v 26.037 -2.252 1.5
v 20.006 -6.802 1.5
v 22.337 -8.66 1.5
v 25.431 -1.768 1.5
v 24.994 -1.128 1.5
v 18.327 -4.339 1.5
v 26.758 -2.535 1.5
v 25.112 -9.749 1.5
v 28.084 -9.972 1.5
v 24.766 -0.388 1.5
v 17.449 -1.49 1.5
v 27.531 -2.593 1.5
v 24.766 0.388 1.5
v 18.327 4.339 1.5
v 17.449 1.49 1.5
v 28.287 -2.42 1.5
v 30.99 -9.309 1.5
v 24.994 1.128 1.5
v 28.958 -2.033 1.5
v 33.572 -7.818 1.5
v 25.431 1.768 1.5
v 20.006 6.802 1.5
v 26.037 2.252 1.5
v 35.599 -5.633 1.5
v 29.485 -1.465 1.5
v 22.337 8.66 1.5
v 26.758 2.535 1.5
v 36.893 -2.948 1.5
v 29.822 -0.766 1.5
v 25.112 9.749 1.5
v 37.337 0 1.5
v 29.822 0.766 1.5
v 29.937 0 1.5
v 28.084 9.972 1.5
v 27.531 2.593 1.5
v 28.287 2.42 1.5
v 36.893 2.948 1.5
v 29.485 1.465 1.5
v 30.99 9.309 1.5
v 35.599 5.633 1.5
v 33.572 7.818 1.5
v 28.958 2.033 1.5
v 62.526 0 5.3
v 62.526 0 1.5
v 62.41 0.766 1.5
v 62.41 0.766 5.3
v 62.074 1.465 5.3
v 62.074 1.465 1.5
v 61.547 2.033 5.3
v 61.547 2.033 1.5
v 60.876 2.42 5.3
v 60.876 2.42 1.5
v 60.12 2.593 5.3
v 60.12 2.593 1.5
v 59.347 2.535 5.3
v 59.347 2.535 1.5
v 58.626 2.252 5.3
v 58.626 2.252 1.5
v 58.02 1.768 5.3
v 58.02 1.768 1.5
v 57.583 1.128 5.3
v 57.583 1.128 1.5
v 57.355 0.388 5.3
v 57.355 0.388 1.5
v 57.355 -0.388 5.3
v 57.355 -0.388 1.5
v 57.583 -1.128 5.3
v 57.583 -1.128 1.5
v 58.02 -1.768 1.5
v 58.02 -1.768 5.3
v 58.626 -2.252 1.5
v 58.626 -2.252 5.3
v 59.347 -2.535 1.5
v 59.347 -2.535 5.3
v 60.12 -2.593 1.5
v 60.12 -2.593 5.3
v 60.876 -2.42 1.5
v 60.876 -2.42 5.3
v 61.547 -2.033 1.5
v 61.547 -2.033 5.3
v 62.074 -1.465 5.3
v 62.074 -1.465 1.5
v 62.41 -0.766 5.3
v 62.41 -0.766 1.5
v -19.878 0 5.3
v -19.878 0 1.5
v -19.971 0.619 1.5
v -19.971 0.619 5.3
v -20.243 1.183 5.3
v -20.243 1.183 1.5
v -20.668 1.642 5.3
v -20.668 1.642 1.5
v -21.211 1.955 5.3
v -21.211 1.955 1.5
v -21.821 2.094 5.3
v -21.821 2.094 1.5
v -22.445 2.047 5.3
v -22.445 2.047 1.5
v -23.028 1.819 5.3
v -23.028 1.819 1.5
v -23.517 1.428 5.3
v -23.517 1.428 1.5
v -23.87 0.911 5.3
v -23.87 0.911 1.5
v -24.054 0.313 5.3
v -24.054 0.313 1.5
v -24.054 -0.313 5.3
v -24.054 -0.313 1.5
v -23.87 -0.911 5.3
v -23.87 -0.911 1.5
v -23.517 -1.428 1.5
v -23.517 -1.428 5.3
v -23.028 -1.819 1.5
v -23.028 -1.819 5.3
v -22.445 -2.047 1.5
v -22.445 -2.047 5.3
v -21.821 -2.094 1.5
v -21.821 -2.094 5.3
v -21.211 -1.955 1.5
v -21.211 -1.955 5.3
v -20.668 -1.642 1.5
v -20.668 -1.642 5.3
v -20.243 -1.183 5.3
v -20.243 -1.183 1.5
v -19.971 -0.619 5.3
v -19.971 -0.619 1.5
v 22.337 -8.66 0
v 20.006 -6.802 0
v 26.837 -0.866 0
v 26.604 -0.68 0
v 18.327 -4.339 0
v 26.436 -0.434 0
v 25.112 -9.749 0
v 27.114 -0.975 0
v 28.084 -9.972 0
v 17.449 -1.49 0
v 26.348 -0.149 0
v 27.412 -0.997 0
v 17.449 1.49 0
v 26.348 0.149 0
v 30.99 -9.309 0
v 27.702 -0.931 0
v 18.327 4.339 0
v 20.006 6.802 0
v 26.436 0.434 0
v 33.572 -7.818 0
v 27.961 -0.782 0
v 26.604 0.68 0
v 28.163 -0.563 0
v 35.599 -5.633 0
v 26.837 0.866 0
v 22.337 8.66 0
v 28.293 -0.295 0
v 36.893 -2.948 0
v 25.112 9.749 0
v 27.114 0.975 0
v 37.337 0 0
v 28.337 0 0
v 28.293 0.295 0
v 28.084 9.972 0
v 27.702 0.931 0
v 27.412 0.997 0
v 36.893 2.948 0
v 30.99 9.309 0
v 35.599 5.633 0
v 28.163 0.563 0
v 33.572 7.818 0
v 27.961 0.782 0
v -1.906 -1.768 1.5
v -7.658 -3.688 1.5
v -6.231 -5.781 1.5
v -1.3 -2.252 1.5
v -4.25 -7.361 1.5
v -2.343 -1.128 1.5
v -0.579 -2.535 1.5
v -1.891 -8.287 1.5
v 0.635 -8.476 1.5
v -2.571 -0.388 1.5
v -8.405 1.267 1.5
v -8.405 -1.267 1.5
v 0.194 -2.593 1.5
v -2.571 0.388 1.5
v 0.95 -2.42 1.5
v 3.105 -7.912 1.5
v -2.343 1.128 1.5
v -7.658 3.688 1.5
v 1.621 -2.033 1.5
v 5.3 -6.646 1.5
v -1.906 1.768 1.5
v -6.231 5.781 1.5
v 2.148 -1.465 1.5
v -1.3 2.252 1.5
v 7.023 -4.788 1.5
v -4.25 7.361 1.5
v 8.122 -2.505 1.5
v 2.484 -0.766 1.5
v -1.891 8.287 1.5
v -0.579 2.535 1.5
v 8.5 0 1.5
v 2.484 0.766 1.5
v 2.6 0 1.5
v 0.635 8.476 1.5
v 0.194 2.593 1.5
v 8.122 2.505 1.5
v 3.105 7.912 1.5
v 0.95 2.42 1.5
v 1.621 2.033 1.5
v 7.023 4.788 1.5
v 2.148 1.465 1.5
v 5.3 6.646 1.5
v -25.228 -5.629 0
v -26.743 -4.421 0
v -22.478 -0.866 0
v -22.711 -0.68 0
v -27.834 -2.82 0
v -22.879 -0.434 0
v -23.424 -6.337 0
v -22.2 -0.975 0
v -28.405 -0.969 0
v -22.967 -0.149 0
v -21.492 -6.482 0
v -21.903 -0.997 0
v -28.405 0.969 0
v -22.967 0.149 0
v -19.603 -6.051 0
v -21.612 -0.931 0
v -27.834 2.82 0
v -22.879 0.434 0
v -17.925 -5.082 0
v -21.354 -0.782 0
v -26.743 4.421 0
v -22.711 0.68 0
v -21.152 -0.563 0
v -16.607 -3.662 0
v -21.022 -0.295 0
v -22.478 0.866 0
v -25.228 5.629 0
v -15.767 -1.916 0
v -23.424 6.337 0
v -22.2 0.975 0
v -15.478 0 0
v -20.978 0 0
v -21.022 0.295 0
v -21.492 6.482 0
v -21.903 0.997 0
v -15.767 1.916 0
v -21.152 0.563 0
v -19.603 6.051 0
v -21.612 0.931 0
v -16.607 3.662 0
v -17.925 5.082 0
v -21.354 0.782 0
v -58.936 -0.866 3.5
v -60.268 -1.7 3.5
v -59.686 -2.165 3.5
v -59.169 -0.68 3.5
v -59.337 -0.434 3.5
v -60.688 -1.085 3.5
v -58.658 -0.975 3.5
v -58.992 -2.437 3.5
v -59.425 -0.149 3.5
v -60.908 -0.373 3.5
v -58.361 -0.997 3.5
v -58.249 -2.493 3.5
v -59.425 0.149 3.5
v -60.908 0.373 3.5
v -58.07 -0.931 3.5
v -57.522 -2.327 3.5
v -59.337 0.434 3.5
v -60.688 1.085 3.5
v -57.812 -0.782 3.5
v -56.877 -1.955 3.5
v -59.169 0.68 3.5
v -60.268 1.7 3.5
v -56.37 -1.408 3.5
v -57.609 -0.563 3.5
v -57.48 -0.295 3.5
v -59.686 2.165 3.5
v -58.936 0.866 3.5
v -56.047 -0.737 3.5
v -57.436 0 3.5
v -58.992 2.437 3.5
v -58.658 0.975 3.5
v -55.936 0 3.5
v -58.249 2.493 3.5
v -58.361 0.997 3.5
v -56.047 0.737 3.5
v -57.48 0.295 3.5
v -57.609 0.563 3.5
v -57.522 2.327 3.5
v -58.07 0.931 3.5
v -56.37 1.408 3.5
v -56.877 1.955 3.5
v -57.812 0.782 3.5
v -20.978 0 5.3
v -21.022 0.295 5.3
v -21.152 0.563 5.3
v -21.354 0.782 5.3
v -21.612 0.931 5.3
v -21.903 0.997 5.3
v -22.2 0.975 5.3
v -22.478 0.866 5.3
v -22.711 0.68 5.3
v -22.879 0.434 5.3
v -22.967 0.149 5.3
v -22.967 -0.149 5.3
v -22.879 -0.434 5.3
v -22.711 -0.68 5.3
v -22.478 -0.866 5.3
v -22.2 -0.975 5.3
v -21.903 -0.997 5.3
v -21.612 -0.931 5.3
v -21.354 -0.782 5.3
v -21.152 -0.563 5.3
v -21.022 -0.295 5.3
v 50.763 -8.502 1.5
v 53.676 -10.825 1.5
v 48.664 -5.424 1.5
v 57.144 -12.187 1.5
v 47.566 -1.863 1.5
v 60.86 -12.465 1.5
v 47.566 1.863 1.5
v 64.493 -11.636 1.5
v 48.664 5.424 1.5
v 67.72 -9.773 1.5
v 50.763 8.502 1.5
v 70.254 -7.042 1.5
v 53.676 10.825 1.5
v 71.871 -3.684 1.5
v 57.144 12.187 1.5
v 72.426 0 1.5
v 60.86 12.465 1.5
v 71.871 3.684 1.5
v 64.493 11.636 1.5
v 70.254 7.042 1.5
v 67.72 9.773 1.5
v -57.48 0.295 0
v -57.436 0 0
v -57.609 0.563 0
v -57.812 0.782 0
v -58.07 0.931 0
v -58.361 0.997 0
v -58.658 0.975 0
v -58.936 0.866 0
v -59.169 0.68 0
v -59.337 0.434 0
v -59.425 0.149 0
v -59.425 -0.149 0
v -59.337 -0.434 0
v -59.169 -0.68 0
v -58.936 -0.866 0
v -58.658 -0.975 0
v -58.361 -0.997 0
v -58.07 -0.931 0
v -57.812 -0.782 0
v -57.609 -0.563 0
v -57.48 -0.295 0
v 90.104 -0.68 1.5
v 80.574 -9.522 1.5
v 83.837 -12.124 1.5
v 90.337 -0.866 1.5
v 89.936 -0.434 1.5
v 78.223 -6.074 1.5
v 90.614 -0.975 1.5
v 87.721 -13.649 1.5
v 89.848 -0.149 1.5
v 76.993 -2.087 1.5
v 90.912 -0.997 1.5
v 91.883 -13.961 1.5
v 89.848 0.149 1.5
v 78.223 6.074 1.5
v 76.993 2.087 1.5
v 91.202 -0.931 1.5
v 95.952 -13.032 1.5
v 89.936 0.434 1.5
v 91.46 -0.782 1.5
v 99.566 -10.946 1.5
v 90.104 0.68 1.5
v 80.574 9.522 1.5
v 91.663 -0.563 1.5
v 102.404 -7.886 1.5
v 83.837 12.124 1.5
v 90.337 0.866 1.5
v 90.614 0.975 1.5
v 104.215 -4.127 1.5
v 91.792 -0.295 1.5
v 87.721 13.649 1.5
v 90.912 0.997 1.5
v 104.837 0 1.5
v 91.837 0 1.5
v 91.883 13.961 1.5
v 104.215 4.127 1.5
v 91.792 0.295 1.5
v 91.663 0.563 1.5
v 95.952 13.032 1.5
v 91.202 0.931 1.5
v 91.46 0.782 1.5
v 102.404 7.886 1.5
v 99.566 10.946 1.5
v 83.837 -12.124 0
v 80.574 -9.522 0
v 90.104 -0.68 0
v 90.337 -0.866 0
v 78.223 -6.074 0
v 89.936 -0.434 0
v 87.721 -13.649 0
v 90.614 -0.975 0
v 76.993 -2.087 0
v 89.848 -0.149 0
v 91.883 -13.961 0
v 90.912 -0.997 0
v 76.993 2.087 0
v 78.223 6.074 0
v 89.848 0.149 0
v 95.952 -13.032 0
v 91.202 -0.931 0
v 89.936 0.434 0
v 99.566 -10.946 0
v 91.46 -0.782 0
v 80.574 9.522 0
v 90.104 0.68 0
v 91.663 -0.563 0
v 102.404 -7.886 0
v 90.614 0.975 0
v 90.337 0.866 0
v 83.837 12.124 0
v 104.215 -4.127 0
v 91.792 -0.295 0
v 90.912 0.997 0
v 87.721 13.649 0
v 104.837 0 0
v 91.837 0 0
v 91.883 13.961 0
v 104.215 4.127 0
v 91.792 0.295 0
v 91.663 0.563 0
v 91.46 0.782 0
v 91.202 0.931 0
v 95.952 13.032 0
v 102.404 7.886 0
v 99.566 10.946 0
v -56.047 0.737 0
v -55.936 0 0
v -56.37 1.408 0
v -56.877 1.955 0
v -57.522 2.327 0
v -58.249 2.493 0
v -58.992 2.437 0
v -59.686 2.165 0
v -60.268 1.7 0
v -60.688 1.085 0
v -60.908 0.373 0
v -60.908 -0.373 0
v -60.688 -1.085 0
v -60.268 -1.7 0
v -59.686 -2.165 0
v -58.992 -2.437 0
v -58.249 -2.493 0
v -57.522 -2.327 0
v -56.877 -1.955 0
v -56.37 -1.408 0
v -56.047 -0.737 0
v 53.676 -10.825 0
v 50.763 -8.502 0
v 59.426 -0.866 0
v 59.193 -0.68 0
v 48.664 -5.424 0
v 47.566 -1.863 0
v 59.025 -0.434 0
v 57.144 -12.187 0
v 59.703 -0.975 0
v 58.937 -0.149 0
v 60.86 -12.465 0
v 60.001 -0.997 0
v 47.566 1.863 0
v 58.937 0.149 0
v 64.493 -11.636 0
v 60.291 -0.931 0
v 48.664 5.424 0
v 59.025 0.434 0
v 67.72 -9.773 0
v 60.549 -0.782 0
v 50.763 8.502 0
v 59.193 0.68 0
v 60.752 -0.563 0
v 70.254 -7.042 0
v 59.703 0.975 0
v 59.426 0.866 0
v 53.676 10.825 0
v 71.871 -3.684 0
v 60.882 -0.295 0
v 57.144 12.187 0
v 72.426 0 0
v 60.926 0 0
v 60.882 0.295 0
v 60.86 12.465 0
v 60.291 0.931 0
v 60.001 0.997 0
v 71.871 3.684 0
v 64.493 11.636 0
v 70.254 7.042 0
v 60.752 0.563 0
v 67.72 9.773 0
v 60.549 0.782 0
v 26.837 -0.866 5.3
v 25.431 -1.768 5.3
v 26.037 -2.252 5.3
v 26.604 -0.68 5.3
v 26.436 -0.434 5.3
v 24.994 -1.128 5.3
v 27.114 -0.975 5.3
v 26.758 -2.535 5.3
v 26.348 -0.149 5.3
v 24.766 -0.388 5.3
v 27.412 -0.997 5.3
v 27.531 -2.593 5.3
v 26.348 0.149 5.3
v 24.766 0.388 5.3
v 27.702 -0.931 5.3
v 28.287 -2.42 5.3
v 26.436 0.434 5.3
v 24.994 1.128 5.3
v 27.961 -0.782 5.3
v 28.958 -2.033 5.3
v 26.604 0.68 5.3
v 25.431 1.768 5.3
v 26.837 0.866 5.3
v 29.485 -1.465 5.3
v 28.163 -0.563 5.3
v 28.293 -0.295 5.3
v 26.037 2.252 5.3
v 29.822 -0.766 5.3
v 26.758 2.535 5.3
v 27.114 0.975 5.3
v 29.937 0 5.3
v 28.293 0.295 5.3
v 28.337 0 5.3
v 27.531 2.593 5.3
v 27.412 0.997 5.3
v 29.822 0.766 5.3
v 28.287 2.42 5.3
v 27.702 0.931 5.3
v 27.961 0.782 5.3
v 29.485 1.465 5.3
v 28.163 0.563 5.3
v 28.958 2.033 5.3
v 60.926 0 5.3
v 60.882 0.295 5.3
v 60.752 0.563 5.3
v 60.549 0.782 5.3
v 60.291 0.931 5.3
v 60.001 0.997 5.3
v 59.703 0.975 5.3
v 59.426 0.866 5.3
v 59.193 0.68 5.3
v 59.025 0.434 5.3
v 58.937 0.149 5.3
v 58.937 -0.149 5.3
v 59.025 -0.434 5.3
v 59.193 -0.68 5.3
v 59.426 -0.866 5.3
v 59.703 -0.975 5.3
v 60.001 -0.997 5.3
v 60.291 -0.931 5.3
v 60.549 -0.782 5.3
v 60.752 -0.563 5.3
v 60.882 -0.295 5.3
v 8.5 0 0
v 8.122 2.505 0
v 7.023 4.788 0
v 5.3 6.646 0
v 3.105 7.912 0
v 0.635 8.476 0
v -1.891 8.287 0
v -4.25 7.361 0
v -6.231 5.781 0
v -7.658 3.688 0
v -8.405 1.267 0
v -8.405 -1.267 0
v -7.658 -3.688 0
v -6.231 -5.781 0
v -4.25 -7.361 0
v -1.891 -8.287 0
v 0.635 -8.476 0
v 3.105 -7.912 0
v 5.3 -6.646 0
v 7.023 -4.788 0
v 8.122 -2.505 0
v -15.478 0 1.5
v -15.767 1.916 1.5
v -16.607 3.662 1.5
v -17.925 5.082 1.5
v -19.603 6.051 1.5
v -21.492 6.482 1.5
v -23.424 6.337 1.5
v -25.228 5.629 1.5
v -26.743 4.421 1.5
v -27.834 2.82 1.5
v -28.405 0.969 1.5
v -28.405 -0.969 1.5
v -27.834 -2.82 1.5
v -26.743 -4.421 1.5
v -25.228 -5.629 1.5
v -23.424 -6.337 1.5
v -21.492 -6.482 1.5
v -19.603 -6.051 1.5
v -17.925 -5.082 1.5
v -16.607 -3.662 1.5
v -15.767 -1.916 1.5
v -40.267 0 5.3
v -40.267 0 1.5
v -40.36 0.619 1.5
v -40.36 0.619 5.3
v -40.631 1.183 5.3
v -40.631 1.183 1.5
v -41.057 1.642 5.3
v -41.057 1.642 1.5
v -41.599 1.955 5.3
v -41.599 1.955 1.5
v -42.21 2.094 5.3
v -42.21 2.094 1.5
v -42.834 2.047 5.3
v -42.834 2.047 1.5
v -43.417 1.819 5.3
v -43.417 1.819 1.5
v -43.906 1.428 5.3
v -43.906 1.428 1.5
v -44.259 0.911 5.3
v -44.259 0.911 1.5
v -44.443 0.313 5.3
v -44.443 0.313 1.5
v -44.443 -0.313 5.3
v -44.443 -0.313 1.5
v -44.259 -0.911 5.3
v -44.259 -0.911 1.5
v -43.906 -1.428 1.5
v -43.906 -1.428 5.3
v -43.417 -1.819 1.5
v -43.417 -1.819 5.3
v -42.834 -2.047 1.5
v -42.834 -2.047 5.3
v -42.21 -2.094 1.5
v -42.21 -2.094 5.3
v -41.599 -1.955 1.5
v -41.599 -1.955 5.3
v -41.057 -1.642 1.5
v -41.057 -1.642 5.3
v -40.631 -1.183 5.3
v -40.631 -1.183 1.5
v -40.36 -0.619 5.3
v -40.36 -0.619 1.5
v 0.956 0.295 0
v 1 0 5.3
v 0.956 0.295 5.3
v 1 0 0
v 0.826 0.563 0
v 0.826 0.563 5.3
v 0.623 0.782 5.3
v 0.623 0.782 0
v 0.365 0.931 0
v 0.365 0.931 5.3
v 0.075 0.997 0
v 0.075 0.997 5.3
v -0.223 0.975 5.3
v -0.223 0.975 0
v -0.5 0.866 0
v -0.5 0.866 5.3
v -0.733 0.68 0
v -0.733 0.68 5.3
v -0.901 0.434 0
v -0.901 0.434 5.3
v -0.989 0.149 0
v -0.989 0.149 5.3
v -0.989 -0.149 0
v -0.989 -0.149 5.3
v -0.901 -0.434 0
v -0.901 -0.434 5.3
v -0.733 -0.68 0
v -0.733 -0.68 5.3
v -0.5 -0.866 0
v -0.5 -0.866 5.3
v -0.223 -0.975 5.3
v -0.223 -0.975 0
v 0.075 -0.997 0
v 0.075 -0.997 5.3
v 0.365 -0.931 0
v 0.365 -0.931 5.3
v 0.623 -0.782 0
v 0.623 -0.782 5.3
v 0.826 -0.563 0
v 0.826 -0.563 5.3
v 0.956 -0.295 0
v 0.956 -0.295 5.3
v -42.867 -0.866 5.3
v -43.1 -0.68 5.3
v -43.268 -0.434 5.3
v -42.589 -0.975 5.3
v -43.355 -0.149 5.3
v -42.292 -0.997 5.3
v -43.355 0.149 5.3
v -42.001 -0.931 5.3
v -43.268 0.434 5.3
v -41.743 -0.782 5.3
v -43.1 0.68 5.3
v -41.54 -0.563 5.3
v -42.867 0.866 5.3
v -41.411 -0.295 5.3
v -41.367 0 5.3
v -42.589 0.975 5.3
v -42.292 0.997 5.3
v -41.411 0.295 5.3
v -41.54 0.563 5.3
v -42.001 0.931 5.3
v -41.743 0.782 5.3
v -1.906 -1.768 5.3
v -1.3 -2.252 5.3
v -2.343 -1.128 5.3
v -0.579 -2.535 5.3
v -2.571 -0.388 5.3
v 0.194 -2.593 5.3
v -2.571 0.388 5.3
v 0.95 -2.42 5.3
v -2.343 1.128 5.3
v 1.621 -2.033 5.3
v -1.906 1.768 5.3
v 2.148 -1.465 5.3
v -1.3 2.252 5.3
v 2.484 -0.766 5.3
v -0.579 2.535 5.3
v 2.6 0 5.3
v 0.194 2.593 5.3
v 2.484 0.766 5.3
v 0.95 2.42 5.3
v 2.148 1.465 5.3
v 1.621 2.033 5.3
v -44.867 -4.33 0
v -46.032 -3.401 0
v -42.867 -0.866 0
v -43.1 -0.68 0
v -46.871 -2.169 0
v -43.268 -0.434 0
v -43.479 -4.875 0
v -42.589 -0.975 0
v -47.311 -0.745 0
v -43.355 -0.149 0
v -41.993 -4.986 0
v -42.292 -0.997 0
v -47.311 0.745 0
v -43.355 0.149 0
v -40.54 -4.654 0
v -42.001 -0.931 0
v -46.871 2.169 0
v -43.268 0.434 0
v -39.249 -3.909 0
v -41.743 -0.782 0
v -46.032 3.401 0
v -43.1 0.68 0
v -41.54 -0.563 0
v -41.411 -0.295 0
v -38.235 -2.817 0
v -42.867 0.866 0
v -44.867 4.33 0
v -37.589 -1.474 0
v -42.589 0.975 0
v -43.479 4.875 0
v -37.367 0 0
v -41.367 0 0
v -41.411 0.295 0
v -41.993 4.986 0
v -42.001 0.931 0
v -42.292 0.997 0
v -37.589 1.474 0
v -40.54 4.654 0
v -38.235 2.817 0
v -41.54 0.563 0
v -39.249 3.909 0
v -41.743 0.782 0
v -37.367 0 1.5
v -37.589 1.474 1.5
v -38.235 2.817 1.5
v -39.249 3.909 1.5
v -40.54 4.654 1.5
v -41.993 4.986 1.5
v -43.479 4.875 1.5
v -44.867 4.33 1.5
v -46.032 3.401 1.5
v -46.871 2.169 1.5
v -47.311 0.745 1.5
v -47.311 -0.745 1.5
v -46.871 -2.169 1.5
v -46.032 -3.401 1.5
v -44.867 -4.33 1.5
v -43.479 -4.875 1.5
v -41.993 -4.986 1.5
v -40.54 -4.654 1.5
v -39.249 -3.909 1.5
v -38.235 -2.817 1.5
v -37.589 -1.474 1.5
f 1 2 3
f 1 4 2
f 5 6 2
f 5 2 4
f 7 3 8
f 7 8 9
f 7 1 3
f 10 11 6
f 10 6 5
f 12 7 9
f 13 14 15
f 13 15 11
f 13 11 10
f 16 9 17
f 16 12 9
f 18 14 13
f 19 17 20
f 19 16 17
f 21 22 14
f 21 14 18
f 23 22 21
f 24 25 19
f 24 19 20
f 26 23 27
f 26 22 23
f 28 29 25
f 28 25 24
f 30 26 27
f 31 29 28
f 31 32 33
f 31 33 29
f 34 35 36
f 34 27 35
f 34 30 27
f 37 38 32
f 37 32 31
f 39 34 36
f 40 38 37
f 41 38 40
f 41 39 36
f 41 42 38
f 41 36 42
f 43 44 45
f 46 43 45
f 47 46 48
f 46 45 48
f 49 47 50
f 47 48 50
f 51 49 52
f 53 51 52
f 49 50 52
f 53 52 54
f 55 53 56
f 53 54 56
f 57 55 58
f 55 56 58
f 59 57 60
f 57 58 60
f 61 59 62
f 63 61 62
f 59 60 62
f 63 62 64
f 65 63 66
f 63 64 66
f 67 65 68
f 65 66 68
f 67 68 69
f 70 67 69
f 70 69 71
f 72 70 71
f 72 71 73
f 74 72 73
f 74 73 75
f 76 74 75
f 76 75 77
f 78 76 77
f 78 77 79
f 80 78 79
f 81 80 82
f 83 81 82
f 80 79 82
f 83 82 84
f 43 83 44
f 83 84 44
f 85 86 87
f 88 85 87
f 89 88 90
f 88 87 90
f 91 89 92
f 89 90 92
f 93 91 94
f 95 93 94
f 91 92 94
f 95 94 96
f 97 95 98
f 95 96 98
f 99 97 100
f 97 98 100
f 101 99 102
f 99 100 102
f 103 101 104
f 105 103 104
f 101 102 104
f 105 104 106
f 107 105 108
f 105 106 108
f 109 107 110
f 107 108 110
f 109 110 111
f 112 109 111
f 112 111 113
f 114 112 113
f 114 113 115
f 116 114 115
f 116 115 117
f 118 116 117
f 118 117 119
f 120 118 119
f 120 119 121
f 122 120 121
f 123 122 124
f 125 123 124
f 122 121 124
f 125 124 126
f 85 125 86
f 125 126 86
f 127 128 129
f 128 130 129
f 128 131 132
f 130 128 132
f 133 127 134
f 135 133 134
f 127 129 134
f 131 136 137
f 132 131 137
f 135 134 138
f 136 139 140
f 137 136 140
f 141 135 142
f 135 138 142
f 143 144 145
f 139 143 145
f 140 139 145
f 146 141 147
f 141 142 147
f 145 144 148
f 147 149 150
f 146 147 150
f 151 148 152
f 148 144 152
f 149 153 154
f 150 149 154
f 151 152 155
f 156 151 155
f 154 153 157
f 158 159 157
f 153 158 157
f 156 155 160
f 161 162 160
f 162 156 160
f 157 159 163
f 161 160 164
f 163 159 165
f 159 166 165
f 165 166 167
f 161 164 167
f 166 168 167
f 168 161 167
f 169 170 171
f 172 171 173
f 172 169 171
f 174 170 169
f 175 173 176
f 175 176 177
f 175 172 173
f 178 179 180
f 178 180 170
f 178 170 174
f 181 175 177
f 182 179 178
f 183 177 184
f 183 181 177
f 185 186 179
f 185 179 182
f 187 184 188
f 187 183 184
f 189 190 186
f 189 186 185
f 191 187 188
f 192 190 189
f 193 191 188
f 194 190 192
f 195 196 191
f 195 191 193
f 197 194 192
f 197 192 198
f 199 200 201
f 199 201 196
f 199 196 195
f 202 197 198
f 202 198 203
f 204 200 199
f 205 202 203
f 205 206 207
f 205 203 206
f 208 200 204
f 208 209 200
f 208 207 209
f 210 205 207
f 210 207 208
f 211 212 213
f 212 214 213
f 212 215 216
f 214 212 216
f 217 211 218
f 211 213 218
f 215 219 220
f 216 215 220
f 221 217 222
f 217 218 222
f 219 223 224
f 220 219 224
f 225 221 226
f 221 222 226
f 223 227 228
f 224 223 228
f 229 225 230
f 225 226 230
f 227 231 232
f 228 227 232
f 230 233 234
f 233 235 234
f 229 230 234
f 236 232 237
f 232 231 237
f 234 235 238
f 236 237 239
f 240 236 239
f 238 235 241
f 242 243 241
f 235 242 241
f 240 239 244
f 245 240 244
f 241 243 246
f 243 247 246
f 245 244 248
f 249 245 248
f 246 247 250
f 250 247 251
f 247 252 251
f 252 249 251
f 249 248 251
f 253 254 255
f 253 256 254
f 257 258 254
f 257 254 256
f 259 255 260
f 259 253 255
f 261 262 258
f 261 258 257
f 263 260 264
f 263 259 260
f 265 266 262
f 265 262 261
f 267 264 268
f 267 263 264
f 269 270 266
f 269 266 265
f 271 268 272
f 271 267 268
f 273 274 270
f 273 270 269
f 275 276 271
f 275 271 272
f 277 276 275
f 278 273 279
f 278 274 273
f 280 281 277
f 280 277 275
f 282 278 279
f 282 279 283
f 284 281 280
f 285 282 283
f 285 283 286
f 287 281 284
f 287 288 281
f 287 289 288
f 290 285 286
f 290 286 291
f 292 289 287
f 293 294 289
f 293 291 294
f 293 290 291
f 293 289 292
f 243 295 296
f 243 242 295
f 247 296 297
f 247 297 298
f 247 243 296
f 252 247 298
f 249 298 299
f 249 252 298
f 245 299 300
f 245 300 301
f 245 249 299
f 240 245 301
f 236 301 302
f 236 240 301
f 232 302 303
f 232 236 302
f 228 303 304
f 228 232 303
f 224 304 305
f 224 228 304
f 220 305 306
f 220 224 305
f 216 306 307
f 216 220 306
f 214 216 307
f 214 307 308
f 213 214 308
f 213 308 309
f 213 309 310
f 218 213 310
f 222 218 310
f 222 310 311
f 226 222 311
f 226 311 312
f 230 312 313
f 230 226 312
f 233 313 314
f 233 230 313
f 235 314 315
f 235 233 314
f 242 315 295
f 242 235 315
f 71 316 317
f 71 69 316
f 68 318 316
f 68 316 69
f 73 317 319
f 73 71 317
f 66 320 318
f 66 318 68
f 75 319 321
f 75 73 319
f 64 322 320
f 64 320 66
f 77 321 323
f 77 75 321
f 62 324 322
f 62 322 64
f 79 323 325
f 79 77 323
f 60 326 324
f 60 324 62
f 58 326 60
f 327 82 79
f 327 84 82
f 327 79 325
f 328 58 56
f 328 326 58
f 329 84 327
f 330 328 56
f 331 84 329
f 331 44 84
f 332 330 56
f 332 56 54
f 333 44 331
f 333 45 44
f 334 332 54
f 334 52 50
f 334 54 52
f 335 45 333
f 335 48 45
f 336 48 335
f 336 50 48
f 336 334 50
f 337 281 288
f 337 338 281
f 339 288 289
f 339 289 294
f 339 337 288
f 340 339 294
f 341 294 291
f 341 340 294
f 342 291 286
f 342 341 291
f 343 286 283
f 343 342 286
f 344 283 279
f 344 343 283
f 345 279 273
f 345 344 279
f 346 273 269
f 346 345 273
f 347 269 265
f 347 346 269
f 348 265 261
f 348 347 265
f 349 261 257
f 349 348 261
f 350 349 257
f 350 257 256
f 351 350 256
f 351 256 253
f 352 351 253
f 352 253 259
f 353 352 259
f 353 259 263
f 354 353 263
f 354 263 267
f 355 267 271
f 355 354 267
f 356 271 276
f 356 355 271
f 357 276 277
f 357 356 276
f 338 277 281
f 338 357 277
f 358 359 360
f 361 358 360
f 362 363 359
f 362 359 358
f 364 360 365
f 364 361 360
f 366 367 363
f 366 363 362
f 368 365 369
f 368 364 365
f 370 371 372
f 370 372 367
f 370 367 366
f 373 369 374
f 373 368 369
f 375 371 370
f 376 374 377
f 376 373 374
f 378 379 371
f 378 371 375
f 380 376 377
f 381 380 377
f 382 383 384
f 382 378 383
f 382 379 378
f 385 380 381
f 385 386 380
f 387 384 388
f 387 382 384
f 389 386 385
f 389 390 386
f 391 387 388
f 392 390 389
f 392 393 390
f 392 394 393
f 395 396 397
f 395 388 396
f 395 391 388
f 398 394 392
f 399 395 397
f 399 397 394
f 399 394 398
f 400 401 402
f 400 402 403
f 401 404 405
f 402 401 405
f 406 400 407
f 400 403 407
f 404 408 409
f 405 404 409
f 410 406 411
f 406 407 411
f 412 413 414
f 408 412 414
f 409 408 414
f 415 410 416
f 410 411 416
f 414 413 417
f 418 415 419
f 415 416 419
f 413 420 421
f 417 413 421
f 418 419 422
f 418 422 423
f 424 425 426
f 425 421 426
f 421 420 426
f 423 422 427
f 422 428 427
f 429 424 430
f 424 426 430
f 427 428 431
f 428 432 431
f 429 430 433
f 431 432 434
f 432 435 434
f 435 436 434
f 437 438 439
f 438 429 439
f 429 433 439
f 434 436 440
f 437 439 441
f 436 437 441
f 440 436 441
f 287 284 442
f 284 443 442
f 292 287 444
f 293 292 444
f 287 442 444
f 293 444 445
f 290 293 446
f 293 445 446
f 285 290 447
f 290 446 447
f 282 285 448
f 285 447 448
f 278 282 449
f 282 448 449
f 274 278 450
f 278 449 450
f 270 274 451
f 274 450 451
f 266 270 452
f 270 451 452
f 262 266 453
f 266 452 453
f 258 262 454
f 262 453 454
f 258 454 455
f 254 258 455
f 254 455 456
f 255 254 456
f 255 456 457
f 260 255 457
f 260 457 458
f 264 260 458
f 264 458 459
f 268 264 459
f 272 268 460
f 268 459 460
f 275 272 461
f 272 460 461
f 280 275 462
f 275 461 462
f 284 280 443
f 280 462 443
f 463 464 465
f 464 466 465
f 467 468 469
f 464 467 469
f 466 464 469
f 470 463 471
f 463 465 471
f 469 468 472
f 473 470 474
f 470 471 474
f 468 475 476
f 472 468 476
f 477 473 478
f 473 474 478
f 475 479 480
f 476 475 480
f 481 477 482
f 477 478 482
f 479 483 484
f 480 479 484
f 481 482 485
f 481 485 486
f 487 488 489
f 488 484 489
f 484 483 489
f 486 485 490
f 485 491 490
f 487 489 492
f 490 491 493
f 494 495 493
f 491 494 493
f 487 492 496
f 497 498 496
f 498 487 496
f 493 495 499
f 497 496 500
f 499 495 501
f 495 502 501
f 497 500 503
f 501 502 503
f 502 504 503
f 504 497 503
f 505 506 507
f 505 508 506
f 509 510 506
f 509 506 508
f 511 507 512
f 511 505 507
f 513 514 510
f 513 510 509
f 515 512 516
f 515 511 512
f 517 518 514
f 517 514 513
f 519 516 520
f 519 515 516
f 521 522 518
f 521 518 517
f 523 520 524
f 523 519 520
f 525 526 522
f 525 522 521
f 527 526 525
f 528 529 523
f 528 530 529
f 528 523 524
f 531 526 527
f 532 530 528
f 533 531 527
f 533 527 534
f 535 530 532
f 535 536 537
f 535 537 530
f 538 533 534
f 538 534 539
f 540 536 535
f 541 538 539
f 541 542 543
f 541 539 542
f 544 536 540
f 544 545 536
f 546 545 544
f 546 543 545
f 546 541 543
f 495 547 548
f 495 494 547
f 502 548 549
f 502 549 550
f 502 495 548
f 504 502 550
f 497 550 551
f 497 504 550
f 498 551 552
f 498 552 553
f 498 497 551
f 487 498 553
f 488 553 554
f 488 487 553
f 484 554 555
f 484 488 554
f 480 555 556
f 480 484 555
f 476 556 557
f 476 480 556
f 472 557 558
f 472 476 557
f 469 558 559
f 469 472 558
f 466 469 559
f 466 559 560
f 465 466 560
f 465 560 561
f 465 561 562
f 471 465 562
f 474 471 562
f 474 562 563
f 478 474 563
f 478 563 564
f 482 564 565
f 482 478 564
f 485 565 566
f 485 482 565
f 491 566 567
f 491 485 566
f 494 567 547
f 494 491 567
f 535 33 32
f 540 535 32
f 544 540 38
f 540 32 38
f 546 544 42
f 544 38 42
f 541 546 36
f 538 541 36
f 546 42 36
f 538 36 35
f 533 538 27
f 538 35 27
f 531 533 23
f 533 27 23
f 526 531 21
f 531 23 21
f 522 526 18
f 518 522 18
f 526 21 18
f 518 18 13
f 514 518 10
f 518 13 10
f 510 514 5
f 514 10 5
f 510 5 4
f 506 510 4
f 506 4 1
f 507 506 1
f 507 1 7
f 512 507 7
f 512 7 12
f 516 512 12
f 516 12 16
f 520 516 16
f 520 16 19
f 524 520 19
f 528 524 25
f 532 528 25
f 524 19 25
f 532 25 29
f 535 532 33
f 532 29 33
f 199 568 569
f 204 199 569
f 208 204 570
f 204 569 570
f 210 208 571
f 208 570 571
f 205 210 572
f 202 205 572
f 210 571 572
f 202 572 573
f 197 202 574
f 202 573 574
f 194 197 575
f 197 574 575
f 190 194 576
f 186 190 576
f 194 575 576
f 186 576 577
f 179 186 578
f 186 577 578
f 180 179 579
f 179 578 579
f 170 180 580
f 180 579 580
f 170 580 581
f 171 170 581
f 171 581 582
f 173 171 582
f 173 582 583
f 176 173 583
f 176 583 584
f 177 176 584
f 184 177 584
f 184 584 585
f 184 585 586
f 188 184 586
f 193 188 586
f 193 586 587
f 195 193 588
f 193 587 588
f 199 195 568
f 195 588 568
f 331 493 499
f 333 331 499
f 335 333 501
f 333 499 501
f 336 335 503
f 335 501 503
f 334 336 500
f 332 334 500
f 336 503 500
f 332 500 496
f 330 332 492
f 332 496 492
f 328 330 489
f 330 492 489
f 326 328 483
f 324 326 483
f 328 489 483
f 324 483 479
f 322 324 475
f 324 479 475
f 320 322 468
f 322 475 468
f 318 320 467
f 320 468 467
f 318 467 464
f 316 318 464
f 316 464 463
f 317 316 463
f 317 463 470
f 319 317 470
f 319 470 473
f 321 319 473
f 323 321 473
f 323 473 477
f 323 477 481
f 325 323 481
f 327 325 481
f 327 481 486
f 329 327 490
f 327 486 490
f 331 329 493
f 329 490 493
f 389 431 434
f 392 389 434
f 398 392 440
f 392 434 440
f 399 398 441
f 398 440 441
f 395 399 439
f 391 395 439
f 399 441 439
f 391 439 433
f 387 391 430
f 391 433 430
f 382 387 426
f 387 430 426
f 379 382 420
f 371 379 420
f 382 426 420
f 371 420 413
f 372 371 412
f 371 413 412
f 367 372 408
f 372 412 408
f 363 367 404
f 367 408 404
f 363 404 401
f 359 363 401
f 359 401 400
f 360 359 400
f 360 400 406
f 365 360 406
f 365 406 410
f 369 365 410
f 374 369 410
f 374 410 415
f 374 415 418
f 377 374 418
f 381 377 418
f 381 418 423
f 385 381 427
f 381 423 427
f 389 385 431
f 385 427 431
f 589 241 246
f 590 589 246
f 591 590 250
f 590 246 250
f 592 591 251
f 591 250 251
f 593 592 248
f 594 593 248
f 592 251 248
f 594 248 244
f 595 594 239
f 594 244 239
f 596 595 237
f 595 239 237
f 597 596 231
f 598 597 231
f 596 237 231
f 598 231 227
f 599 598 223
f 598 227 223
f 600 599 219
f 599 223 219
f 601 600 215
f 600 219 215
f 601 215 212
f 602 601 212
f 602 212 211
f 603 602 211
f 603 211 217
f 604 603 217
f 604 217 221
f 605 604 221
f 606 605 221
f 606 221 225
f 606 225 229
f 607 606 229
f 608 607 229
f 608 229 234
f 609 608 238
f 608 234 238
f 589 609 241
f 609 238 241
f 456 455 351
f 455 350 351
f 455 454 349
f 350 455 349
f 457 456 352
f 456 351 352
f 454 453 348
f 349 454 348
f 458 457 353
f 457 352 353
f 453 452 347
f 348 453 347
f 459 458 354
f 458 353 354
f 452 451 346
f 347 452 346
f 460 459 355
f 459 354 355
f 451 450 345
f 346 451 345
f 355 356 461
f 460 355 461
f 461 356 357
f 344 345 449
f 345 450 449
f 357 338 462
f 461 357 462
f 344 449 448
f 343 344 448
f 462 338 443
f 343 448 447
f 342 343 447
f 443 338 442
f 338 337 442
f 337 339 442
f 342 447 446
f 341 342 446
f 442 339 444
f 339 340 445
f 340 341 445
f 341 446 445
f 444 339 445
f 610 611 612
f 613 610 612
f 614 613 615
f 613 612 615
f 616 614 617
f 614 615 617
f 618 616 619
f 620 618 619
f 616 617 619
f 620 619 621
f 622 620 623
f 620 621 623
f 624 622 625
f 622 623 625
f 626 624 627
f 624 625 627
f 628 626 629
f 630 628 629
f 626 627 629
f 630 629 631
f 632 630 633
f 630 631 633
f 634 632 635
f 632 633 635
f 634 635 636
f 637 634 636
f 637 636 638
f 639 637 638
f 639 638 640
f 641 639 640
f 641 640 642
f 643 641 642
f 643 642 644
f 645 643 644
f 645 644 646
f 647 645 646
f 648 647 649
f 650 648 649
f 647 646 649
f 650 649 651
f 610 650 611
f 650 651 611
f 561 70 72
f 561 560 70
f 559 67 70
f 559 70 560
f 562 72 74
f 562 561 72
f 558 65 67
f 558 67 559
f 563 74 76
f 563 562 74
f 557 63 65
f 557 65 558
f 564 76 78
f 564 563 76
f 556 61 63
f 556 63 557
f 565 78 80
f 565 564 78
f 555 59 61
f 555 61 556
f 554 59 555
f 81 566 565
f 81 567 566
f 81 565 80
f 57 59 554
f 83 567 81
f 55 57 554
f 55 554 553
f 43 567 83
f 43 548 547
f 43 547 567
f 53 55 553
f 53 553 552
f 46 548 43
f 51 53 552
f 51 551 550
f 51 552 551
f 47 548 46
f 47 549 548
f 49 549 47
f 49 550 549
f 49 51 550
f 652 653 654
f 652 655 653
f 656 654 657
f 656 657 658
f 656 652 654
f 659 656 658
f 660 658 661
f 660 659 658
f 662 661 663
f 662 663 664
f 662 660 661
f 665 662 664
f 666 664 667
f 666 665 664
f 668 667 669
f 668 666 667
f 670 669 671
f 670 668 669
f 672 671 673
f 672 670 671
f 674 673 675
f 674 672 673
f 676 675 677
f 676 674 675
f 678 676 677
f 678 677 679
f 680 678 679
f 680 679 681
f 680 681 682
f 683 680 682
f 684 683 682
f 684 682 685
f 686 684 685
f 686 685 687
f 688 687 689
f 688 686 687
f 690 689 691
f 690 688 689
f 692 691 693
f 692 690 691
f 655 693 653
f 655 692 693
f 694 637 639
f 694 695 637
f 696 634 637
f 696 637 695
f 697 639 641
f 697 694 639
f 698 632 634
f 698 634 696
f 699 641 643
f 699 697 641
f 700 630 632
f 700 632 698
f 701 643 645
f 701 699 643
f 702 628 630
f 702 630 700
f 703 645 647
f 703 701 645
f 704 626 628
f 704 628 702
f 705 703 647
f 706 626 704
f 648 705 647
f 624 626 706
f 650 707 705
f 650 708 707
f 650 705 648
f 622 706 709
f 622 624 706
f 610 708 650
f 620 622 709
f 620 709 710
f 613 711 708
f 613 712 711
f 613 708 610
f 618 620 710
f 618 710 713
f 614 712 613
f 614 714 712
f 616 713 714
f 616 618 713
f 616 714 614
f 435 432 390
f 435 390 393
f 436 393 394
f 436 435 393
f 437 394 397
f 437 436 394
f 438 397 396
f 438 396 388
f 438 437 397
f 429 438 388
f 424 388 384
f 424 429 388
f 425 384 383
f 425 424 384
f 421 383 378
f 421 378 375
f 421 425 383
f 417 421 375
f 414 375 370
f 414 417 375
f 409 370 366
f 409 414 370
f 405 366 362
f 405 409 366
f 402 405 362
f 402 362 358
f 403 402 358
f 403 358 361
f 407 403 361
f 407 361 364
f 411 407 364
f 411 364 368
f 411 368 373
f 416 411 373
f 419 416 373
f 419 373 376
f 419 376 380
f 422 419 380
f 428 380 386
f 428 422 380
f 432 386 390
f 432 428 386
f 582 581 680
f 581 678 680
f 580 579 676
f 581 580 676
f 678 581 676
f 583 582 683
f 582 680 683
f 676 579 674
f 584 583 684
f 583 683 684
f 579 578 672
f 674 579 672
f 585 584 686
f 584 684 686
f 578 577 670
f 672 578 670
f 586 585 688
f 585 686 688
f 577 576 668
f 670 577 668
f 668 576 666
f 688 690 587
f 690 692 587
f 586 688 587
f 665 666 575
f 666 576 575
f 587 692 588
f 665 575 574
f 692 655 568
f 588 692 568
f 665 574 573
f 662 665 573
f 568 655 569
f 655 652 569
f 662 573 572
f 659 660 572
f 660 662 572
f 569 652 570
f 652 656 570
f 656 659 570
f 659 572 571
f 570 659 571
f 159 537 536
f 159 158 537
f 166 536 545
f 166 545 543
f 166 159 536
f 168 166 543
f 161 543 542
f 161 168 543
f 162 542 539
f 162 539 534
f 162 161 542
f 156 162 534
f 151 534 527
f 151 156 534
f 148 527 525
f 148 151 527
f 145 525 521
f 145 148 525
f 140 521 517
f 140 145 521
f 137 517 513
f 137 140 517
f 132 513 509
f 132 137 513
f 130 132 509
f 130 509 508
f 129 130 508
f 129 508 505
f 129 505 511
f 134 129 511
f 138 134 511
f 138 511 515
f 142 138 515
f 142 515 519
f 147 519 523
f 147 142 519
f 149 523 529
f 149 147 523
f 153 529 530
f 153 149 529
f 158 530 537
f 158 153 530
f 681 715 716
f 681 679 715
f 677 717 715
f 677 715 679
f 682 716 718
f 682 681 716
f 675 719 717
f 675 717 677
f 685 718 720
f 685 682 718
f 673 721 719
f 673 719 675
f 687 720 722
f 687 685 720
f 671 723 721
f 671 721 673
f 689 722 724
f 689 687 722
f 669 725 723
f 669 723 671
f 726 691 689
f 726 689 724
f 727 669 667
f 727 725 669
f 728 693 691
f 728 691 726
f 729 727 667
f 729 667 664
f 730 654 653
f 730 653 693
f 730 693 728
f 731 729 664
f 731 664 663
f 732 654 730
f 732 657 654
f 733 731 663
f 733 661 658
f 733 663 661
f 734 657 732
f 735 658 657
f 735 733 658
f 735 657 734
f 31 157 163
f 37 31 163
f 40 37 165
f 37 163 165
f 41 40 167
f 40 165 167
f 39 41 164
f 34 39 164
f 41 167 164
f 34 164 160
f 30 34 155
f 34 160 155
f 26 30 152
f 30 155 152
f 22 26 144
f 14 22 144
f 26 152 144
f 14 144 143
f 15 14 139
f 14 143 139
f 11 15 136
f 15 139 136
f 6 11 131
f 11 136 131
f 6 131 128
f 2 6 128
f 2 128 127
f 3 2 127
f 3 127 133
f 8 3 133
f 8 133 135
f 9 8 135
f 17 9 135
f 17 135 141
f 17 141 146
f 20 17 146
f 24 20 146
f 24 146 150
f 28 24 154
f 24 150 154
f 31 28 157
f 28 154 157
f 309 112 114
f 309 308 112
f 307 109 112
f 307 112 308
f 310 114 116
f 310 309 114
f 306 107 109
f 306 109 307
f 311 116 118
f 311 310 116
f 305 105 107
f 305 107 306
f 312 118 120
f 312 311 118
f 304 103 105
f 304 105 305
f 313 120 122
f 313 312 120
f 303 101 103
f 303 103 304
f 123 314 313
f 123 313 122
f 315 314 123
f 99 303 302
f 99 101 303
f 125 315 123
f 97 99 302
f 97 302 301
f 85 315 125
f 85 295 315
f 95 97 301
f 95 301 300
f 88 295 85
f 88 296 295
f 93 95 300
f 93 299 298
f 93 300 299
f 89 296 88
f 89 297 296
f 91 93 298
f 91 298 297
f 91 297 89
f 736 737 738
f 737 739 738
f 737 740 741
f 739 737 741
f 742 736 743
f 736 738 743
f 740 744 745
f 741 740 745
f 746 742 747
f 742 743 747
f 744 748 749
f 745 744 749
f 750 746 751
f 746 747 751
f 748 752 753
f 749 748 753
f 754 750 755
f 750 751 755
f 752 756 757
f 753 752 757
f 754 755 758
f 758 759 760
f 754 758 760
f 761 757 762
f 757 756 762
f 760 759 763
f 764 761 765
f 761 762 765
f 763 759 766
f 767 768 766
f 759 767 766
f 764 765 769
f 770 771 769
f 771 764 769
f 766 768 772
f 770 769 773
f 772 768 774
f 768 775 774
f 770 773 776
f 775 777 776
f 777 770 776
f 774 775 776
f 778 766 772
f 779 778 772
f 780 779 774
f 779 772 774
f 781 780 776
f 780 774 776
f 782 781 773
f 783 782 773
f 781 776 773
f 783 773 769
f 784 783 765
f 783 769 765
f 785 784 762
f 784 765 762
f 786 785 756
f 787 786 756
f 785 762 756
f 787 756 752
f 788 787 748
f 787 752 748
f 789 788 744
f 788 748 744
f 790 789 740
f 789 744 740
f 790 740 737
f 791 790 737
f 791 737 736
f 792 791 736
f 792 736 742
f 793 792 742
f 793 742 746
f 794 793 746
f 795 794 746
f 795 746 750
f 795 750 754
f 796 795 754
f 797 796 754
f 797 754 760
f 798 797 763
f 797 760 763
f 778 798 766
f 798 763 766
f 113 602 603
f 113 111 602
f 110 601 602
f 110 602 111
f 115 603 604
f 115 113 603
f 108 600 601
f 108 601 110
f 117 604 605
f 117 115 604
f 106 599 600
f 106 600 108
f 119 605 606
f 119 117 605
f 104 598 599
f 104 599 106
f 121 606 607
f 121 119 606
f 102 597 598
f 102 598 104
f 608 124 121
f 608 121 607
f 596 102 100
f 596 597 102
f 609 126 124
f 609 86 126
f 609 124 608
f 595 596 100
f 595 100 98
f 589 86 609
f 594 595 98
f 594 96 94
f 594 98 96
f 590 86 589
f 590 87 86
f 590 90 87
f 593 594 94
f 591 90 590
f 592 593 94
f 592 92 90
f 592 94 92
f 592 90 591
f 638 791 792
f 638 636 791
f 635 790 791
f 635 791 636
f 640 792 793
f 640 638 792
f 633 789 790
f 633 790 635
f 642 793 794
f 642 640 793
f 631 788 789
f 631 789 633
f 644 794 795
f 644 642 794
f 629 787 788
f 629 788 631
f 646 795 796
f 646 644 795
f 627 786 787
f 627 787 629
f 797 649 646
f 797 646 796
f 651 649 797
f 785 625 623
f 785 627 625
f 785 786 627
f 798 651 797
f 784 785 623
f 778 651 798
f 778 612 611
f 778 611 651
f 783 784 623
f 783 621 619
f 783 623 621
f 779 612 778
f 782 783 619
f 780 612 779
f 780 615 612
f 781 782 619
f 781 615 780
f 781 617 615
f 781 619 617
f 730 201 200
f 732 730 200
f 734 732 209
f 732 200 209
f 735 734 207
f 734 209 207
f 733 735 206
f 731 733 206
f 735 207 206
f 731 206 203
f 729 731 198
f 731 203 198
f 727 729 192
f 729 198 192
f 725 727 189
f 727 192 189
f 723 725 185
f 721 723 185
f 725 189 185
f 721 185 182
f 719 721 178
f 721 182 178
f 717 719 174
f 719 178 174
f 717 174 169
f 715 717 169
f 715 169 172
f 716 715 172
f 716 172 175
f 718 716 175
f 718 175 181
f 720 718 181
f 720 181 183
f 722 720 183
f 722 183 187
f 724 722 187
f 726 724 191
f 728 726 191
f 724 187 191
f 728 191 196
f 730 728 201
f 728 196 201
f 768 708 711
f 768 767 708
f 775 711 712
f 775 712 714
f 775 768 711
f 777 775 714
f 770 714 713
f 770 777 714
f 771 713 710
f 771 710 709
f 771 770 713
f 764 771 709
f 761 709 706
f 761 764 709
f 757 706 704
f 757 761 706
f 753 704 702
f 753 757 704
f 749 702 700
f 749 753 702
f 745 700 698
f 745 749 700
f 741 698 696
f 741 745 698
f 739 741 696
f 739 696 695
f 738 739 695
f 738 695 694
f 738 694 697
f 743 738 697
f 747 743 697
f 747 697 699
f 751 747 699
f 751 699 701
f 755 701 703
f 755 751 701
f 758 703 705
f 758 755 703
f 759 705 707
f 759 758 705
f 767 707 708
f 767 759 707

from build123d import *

# Parameters (mm, degrees)
F0_R      = 8.5
F0_R_2    = 1
F1_DEPTH  = 1.5
F2_R      = 2.6
F2_R_2    = 1
F3_DEPTH  = 3.8
F4_R      = 10
F4_R_2    = 1
F5_DEPTH  = 1.5
F4_R_3    = 12.5
F4_R_4    = 6.5
F4_R_5    = 5
F4_R_6    = 2.5
F6_R      = 2.6
F6_R_2    = 1
F7_DEPTH  = 3.8
F8_R      = 2.6
F8_R_2    = 1
F9_DEPTH  = 3.8
F10_R     = 2.1
F10_R_2   = 1
F11_DEPTH = 3.8
F12_R     = 2.1
F12_R_2   = 1
F13_DEPTH = 3.8
F14_DEPTH = 2
F15_R     = 14
F15_R_2   = 1
F16_DEPTH = 1.5


# Not quite as in the source:
# - a feature names something its author has since deleted; it is built from what else it names


with BuildPart() as f1:
    # F0 (on Top) → F1 (new body)
    with BuildSketch(Plane.XY):
        Circle(F0_R)
        Circle(F0_R_2, mode=Mode.SUBTRACT)
    extrude(amount=F1_DEPTH)

    # F2 (on face) → F3 (join)
    with BuildSketch(Plane.XY.offset(1.5)):
        Circle(F2_R)
        Circle(F2_R_2, mode=Mode.SUBTRACT)
    extrude(amount=F3_DEPTH)


with BuildPart() as f5:
    # F4 (on Top) → F5 (new body)
    with BuildSketch(Plane.XY):
        with Locations((27.3370184205, 0)):
            Circle(F4_R)
        with Locations((27.3370184205, 0)):
            Circle(F4_R_2, mode=Mode.SUBTRACT)
    extrude(amount=F5_DEPTH)

    # F6 (on face) → F7 (join)
    with BuildSketch(Plane.XY.offset(1.5)):
        with Locations((27.3370184205, 0)):
            Circle(F6_R)
        with Locations((27.3370184205, 0)):
            Circle(F6_R_2, mode=Mode.SUBTRACT)
    extrude(amount=F7_DEPTH)


with BuildPart() as f5b:
    # F4 (on Top) → F5, piece 2 (new body)
    with BuildSketch(Plane.XY):
        with Locations((59.9259639982, 0)):
            Circle(F4_R_3)
        with Locations((59.9259639982, 0)):
            Circle(F4_R_2, mode=Mode.SUBTRACT)
    extrude(amount=F5_DEPTH)

    # F8 (on face) → F9 (join)
    with BuildSketch(Plane.XY.offset(1.5)):
        with Locations((59.9259639982, 0)):
            Circle(F8_R)
        with Locations((59.9259639982, 0)):
            Circle(F8_R_2, mode=Mode.SUBTRACT)
    extrude(amount=F9_DEPTH)


with BuildPart() as f5c:
    # F4 (on Top) → F5, piece 3 (new body)
    with BuildSketch(Plane.XY):
        with Locations((-21.9778250903, 0)):
            Circle(F4_R_4)
        with Locations((-21.9778250903, 0)):
            Circle(F4_R_2, mode=Mode.SUBTRACT)
    extrude(amount=F5_DEPTH)

    # F10 (on face) → F11 (join)
    with BuildSketch(Plane.XY.offset(1.5)):
        with Locations((-21.9778250903, 0)):
            Circle(F10_R)
        with Locations((-21.9778250903, 0)):
            Circle(F10_R_2, mode=Mode.SUBTRACT)
    extrude(amount=F11_DEPTH)


with BuildPart() as f5d:
    # F4 (on Top) → F5, piece 4 (new body)
    with BuildSketch(Plane.XY):
        with Locations((-42.3665866256, 0)):
            Circle(F4_R_5)
        with Locations((-42.3665866256, 0)):
            Circle(F4_R_2, mode=Mode.SUBTRACT)
    extrude(amount=F5_DEPTH)

    # F12 (on face) → F13 (join)
    with BuildSketch(Plane.XY.offset(1.5)):
        with Locations((-42.3665866256, 0)):
            Circle(F12_R)
        with Locations((-42.3665866256, 0)):
            Circle(F12_R_2, mode=Mode.SUBTRACT)
    extrude(amount=F13_DEPTH)


with BuildPart() as f5e:
    # F4 (on Top) → F5, piece 5 (new body)
    with BuildSketch(Plane.XY):
        with Locations((-58.4356933832, 0)):
            Circle(F4_R_6)
        with Locations((-58.4356933832, 0)):
            Circle(F4_R_2, mode=Mode.SUBTRACT)
    extrude(amount=F5_DEPTH)

    # F14 (add): a face of the model
    f14_faces = [f5e.faces().sort_by_distance(p)[0] for p in [
        (-60.8649827051, 0, 1.5),
    ]]
    extrude(f14_faces, amount=F14_DEPTH)


with BuildPart() as f16:
    # F15 (on Top) → F16 (new body)
    with BuildSketch(Plane.XY):
        with Locations((90.8367805009, 0)):
            Circle(F15_R)
        with Locations((90.8367805009, 0)):
            Circle(F15_R_2, mode=Mode.SUBTRACT)
    extrude(amount=F16_DEPTH)


solid = Compound([f1.part, f5.part, f5b.part, f5c.part, f5d.part, f5e.part, f16.part])
